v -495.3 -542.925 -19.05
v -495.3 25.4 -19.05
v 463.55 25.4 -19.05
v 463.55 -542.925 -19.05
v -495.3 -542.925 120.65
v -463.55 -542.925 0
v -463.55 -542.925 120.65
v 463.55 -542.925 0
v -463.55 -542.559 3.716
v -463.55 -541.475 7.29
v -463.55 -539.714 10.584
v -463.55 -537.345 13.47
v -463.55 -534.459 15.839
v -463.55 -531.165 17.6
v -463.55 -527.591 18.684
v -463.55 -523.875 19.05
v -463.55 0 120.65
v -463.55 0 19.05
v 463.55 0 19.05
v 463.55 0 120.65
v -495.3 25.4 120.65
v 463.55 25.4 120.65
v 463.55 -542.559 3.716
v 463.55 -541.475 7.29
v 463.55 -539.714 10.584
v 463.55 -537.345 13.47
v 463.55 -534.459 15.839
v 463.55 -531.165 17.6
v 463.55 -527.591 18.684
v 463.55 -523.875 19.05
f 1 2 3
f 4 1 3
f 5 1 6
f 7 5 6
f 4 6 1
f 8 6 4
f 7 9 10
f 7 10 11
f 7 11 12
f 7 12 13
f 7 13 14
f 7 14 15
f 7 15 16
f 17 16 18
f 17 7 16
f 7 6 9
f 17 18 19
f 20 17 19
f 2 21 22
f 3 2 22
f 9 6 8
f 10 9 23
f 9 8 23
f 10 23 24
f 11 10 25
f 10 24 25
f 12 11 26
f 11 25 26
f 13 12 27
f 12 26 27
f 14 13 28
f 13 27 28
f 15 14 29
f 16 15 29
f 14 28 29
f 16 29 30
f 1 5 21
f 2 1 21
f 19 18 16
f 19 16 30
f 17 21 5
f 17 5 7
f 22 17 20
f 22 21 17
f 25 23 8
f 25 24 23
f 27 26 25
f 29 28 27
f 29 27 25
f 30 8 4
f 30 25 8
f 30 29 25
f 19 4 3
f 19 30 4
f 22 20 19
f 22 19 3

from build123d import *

# Parameters (mm, degrees)
F0_W          = 927.1
F0_H          = 38.1
F1_DEPTH      = 542.925
F3_W          = 31.75
F3_H          = 568.325
F4_DEPTH      = 120.65
F4_DEPTH_BACK = 19.05
F5_W          = 927.1
F5_H          = 25.4
F6_DEPTH      = 120.65
F6_DEPTH_BACK = 19.05
F7_R          = 19.05


with BuildPart() as f1:
    # F0 (on Front) → F1 (new body)
    with BuildSketch(Plane.XZ):
        Rectangle(F0_W, F0_H)
    extrude(amount=F1_DEPTH)

    # F3 (on Top) → F4 (join, two sides)
    with BuildSketch(Plane.XY) as f4_sk:
        with Locations((-479.425, -258.7625)):
            Rectangle(F3_W, F3_H)
    extrude(amount=F4_DEPTH)
    extrude(f4_sk.sketch, amount=-F4_DEPTH_BACK)

    # F5 (on Top) → F6 (join, two sides)
    with BuildSketch(Plane.XY) as f6_sk:
        with Locations((0, 12.7)):
            Rectangle(F5_W, F5_H)
    extrude(amount=F6_DEPTH)
    extrude(f6_sk.sketch, amount=-F6_DEPTH_BACK)

    # F7
    f7_edges = [f1.edges().sort_by_distance(p)[0] for p in [
        (0, -542.925, 19.05),
    ]]
    fillet(f7_edges, radius=F7_R)


solid = f1.part
